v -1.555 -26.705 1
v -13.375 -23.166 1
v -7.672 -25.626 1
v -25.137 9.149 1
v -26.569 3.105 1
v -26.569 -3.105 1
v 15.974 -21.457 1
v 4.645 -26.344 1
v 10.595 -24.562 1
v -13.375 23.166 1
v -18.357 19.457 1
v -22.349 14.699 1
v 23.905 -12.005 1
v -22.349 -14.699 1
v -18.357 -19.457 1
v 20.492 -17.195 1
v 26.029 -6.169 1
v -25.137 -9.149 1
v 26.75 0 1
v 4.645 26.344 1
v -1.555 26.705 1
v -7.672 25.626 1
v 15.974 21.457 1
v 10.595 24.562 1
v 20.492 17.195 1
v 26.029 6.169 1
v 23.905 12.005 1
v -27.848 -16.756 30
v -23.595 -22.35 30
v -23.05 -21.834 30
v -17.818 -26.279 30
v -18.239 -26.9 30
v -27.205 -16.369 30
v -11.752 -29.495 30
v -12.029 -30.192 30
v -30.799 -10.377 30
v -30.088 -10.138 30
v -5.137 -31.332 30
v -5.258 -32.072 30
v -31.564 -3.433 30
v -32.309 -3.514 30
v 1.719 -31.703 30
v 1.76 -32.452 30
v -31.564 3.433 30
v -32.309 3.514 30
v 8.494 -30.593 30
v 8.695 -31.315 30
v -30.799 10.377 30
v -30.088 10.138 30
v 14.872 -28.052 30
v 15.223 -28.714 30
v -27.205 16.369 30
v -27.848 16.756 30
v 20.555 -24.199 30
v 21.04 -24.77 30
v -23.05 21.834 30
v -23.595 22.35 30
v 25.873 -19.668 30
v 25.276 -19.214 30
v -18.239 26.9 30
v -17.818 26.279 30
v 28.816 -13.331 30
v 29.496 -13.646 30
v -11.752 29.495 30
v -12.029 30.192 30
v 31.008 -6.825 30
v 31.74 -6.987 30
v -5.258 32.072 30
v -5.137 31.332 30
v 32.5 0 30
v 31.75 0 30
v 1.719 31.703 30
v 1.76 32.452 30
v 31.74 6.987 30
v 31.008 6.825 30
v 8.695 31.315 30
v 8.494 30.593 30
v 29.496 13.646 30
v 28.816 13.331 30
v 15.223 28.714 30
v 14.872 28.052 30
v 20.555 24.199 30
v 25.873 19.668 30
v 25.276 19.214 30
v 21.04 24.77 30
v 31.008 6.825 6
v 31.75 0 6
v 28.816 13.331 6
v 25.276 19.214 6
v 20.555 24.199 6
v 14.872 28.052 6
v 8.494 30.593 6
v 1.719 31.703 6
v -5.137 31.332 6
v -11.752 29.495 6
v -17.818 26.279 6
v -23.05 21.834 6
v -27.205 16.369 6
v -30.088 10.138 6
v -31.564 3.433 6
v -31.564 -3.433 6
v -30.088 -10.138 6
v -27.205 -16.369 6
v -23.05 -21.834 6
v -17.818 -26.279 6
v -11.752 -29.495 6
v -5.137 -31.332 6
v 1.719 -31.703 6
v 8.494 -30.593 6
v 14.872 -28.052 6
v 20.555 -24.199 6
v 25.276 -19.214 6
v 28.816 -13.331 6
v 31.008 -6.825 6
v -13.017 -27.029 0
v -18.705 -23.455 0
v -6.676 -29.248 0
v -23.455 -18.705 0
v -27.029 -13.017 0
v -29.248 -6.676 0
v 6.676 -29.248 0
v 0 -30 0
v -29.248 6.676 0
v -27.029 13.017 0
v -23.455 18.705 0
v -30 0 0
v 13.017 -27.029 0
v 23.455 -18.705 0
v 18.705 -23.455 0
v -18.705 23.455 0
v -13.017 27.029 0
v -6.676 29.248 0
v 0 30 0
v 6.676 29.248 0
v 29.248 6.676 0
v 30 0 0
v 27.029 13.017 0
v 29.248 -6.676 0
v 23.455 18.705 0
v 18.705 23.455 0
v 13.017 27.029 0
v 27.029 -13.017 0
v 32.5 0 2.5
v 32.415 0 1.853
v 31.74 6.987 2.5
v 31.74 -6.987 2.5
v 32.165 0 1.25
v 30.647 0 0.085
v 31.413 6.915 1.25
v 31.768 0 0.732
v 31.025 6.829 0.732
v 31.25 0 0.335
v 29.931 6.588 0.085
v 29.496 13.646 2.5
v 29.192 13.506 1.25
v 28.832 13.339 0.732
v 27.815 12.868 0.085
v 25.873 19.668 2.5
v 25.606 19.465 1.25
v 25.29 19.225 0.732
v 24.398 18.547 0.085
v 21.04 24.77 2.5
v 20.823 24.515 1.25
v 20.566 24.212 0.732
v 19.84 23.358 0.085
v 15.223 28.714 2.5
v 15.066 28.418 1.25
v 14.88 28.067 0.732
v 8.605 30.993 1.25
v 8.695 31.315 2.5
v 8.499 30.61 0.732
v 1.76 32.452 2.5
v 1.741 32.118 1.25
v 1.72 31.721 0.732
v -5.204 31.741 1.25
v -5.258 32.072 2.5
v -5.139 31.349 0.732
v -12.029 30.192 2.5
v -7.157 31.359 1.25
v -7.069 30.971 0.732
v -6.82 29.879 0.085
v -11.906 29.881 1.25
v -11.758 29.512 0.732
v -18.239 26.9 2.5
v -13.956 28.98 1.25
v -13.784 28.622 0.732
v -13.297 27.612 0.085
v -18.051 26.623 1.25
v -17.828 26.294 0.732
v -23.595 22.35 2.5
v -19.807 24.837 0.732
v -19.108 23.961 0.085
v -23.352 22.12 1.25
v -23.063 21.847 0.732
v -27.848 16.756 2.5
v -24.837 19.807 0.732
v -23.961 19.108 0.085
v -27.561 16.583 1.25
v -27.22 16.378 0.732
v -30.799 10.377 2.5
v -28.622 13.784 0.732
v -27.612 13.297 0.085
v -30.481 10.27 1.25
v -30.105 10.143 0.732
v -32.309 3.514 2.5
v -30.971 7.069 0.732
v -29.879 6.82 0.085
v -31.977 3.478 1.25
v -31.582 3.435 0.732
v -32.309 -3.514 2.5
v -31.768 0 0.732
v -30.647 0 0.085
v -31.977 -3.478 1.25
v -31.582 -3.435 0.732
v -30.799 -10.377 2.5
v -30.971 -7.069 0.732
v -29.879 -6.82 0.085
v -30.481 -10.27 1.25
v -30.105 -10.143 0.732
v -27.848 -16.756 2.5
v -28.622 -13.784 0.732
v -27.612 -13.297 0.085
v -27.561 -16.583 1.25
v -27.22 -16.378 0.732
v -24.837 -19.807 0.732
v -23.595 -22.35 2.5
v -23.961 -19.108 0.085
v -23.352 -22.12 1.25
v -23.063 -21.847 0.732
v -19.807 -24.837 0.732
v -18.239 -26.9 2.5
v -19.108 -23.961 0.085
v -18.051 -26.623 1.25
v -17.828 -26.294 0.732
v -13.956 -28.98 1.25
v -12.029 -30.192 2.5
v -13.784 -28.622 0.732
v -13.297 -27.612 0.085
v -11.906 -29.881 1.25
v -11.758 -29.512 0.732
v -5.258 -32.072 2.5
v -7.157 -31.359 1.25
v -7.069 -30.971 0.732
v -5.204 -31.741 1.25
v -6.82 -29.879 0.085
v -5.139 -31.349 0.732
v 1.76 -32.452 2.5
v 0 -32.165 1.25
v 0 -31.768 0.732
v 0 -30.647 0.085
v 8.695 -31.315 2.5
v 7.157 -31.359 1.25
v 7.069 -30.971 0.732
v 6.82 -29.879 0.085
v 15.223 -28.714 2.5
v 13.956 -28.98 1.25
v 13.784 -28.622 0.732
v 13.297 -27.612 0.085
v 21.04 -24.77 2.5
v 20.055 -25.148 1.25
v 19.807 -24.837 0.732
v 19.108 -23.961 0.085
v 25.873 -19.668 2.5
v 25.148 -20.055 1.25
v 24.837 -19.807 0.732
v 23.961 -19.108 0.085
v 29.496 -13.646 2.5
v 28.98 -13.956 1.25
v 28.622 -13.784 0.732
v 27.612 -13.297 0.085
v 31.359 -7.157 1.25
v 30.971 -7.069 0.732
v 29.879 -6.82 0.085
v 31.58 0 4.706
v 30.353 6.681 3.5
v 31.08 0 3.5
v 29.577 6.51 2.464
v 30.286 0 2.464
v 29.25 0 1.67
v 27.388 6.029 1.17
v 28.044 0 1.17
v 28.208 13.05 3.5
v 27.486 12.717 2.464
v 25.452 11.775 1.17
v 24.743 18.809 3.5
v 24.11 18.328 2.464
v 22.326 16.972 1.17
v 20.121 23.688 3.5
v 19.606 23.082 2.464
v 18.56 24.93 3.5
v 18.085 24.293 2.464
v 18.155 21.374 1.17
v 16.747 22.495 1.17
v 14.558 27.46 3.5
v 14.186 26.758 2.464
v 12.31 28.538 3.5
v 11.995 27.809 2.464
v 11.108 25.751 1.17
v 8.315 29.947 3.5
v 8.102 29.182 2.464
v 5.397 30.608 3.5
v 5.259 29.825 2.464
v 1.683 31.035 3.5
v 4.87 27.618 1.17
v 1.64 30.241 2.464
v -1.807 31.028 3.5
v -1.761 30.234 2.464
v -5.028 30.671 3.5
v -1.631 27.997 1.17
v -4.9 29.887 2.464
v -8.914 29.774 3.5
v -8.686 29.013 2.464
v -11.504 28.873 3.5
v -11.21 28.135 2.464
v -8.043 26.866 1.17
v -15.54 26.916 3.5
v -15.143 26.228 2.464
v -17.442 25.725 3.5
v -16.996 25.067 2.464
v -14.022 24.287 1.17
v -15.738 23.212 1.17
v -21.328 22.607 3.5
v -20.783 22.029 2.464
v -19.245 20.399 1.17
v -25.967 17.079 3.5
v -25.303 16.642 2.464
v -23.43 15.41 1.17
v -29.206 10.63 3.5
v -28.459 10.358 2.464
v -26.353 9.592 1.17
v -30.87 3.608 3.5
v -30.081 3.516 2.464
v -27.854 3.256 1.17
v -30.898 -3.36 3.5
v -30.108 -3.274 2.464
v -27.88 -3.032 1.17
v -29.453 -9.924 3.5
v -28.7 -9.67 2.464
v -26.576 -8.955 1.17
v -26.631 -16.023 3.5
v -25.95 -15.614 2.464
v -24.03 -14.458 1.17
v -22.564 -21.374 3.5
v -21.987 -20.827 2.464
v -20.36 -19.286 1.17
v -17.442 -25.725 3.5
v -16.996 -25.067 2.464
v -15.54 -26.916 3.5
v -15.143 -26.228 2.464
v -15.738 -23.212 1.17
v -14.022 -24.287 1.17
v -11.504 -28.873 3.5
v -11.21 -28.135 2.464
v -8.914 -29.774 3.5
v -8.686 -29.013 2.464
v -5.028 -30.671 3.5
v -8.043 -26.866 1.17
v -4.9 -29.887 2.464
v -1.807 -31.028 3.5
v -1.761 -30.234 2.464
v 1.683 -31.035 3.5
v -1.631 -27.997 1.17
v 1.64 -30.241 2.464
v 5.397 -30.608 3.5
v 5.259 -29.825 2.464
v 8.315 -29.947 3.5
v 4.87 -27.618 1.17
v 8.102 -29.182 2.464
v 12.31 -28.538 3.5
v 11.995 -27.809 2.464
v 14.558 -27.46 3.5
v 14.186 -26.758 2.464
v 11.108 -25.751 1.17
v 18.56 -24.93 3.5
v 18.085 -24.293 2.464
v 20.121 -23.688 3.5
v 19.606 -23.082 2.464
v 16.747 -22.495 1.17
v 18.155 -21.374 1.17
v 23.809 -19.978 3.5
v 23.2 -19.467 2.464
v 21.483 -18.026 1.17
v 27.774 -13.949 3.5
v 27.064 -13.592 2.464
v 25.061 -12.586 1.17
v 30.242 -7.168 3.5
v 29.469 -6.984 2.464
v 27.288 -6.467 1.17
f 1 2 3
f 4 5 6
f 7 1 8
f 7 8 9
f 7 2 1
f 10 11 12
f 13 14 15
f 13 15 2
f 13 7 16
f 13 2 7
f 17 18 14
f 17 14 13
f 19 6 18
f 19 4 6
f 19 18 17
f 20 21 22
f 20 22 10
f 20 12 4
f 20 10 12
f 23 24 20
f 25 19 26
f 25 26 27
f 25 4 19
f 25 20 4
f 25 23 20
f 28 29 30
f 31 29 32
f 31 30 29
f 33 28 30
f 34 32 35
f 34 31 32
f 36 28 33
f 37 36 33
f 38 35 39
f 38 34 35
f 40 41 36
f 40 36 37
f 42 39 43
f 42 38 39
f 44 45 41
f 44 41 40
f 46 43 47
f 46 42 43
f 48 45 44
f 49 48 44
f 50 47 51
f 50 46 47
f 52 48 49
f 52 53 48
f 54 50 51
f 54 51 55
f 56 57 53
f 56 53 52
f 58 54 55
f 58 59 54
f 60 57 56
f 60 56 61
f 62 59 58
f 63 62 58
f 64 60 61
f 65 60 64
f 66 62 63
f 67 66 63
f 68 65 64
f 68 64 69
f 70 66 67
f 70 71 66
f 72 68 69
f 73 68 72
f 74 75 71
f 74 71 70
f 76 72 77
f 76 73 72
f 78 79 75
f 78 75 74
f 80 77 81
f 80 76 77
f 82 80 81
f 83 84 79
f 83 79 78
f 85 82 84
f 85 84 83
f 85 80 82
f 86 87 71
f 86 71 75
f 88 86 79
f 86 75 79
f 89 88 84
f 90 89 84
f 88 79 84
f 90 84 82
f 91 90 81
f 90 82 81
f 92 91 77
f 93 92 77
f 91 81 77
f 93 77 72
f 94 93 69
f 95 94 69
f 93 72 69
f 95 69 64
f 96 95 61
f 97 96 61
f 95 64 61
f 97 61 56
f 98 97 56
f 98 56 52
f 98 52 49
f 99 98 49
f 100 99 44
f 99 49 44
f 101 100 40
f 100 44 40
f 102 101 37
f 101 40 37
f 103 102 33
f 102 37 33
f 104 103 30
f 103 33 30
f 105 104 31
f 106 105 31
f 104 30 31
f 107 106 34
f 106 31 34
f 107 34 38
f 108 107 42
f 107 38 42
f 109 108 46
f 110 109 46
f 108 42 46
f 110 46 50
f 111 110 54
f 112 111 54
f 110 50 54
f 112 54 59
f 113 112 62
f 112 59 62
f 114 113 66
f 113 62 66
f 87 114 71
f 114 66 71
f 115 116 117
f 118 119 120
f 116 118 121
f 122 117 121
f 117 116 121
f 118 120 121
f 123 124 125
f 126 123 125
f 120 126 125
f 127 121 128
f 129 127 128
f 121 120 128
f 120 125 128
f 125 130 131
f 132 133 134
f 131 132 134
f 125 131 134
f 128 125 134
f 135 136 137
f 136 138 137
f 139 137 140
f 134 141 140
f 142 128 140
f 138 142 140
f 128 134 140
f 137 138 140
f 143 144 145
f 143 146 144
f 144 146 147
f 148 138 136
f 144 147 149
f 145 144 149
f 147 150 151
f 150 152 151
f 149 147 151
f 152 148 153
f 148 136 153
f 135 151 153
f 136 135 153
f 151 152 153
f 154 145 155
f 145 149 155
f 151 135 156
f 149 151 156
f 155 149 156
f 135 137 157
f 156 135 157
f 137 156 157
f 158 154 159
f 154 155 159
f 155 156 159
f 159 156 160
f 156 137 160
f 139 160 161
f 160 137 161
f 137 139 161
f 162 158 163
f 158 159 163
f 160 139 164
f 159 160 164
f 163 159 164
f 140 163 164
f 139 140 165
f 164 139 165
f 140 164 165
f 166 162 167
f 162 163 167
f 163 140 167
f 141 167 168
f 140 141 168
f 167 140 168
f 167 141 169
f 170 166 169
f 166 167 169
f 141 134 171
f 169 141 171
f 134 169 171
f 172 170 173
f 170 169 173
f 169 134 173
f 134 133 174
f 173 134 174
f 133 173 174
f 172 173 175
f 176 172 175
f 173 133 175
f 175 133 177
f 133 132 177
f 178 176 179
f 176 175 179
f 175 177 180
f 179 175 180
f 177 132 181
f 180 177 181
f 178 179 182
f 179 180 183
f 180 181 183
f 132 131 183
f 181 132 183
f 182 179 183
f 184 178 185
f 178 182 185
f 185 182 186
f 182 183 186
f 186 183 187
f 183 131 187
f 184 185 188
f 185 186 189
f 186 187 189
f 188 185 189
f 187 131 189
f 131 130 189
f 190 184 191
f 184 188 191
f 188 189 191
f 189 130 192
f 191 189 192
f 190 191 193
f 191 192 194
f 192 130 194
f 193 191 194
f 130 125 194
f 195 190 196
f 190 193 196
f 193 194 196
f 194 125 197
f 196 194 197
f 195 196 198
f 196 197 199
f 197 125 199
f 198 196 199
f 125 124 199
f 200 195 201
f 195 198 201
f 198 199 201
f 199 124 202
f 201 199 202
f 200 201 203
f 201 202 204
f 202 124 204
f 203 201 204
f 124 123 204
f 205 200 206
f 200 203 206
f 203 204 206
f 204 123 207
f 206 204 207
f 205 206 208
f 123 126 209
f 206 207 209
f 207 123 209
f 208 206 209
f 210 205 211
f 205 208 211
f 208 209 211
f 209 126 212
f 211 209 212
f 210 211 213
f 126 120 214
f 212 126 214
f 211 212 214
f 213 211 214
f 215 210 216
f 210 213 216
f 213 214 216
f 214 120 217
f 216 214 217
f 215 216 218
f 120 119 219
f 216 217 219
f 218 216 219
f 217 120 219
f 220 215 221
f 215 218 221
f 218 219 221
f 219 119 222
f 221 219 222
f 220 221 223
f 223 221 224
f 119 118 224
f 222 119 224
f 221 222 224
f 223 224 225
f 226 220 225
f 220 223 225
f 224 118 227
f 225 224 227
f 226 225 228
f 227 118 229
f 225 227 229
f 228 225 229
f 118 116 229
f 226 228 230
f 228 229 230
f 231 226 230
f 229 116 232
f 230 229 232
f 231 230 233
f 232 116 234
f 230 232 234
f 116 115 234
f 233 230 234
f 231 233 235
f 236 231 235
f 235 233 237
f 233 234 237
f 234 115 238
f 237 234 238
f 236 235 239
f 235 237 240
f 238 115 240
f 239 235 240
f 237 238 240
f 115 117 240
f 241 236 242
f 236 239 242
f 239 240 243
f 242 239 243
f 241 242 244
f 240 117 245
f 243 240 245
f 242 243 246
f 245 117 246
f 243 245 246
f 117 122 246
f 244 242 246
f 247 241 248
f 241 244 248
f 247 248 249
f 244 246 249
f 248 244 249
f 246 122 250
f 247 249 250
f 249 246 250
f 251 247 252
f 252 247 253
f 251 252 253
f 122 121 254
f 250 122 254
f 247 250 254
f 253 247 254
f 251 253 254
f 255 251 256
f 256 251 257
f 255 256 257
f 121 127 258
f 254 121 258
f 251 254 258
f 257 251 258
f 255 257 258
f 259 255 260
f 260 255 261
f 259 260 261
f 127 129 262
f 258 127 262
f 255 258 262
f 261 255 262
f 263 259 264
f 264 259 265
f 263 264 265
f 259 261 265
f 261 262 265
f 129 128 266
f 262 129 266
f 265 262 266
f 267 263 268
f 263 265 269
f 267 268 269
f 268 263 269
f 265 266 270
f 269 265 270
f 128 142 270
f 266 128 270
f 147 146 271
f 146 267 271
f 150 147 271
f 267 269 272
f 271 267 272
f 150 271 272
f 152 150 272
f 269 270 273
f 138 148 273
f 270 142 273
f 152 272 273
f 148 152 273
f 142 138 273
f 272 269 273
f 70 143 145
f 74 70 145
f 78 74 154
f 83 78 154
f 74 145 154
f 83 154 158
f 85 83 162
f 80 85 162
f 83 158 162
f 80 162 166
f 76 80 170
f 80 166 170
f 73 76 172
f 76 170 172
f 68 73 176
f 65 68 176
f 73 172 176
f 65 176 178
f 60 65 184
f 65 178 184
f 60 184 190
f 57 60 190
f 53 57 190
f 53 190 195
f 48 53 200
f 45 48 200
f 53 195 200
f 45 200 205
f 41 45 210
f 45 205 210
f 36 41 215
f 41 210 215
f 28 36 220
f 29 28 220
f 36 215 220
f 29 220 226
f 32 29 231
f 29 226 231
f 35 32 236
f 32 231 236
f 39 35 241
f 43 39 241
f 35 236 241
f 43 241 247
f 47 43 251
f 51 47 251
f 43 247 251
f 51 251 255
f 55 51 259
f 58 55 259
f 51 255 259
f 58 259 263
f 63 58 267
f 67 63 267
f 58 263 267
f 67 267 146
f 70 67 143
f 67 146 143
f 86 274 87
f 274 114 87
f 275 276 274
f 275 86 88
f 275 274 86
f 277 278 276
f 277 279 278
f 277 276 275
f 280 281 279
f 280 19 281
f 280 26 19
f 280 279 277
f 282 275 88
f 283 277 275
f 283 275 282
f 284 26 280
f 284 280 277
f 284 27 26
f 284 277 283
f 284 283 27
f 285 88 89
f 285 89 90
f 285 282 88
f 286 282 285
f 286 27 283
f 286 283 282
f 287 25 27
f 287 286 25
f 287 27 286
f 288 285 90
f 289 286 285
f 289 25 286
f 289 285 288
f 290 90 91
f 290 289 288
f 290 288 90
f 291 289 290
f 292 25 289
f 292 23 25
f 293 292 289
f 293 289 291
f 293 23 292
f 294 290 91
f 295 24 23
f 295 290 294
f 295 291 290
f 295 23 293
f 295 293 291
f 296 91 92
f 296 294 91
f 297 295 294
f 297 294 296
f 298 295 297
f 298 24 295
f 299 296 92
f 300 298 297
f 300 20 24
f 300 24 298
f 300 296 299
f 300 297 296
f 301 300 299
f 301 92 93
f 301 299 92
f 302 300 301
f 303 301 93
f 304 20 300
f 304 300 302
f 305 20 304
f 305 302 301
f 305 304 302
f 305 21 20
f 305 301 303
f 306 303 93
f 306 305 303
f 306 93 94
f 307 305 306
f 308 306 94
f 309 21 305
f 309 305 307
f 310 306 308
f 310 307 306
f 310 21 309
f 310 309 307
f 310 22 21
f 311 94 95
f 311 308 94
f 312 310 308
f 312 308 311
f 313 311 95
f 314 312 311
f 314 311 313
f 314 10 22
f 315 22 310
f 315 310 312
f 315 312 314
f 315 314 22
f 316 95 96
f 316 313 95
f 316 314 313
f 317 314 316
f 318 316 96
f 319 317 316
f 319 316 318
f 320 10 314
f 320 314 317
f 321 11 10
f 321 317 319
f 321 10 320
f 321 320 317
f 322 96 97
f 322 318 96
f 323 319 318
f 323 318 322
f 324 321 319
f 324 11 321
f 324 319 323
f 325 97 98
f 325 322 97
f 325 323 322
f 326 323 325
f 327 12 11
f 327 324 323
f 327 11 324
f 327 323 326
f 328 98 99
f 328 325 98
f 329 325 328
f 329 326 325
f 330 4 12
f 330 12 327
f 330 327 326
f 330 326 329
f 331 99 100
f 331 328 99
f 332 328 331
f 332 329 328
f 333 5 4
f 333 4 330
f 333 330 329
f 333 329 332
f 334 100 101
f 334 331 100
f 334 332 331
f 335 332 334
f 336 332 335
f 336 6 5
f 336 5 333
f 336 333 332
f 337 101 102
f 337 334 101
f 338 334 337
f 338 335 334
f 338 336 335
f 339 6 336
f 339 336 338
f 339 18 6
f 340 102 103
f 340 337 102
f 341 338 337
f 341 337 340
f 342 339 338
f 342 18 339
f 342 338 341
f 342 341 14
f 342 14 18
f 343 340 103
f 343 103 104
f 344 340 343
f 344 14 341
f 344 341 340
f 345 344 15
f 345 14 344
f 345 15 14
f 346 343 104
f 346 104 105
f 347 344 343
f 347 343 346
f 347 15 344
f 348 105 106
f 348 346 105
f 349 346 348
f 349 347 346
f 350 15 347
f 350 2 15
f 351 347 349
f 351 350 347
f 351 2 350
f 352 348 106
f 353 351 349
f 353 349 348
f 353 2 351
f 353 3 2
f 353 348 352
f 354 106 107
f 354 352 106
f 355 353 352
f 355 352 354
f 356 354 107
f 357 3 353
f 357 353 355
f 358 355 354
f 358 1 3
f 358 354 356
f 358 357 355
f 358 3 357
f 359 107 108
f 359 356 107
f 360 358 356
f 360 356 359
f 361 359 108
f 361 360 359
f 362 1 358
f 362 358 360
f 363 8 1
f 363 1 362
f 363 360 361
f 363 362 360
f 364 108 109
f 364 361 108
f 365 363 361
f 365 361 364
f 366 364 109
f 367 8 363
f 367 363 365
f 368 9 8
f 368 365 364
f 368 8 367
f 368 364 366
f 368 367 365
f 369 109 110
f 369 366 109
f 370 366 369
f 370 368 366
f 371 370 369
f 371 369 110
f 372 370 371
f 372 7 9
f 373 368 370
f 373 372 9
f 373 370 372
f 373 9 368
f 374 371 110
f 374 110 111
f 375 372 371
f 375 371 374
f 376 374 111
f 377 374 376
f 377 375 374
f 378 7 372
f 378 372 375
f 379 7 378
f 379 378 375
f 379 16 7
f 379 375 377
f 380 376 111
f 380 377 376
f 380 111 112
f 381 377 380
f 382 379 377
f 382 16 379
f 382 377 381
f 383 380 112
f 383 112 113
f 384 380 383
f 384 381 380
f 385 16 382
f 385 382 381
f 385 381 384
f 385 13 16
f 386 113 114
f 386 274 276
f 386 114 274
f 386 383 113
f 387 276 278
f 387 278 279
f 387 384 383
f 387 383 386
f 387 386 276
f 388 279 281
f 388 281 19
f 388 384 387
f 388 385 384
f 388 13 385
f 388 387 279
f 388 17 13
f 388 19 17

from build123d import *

# Parameters (mm, degrees)
F0_R     = 32.5
F1_DEPTH = 30
F2_R     = 31.75
F3_DEPTH = 29
F4_R     = 5
F5_R     = 2.5


with BuildPart() as f1:
    # F0 (on Top) → F1 (new body)
    with BuildSketch(Plane.XY):
        Circle(F0_R)
    extrude(amount=F1_DEPTH)

    # F2 (on face) → F3 (cut)
    with BuildSketch(Plane.XY.offset(30)):
        Circle(F2_R)
    extrude(amount=-F3_DEPTH, mode=Mode.SUBTRACT)

    # F4
    f4_edges = [f1.edges().sort_by_distance(p)[0] for p in [
        (-31.75, 0, 1),
    ]]
    fillet(f4_edges, radius=F4_R)

    # F5
    f5_edges = [f1.edges().sort_by_distance(p)[0] for p in [
        (-32.5, 0, 0),
    ]]
    fillet(f5_edges, radius=F5_R)


solid = f1.part
